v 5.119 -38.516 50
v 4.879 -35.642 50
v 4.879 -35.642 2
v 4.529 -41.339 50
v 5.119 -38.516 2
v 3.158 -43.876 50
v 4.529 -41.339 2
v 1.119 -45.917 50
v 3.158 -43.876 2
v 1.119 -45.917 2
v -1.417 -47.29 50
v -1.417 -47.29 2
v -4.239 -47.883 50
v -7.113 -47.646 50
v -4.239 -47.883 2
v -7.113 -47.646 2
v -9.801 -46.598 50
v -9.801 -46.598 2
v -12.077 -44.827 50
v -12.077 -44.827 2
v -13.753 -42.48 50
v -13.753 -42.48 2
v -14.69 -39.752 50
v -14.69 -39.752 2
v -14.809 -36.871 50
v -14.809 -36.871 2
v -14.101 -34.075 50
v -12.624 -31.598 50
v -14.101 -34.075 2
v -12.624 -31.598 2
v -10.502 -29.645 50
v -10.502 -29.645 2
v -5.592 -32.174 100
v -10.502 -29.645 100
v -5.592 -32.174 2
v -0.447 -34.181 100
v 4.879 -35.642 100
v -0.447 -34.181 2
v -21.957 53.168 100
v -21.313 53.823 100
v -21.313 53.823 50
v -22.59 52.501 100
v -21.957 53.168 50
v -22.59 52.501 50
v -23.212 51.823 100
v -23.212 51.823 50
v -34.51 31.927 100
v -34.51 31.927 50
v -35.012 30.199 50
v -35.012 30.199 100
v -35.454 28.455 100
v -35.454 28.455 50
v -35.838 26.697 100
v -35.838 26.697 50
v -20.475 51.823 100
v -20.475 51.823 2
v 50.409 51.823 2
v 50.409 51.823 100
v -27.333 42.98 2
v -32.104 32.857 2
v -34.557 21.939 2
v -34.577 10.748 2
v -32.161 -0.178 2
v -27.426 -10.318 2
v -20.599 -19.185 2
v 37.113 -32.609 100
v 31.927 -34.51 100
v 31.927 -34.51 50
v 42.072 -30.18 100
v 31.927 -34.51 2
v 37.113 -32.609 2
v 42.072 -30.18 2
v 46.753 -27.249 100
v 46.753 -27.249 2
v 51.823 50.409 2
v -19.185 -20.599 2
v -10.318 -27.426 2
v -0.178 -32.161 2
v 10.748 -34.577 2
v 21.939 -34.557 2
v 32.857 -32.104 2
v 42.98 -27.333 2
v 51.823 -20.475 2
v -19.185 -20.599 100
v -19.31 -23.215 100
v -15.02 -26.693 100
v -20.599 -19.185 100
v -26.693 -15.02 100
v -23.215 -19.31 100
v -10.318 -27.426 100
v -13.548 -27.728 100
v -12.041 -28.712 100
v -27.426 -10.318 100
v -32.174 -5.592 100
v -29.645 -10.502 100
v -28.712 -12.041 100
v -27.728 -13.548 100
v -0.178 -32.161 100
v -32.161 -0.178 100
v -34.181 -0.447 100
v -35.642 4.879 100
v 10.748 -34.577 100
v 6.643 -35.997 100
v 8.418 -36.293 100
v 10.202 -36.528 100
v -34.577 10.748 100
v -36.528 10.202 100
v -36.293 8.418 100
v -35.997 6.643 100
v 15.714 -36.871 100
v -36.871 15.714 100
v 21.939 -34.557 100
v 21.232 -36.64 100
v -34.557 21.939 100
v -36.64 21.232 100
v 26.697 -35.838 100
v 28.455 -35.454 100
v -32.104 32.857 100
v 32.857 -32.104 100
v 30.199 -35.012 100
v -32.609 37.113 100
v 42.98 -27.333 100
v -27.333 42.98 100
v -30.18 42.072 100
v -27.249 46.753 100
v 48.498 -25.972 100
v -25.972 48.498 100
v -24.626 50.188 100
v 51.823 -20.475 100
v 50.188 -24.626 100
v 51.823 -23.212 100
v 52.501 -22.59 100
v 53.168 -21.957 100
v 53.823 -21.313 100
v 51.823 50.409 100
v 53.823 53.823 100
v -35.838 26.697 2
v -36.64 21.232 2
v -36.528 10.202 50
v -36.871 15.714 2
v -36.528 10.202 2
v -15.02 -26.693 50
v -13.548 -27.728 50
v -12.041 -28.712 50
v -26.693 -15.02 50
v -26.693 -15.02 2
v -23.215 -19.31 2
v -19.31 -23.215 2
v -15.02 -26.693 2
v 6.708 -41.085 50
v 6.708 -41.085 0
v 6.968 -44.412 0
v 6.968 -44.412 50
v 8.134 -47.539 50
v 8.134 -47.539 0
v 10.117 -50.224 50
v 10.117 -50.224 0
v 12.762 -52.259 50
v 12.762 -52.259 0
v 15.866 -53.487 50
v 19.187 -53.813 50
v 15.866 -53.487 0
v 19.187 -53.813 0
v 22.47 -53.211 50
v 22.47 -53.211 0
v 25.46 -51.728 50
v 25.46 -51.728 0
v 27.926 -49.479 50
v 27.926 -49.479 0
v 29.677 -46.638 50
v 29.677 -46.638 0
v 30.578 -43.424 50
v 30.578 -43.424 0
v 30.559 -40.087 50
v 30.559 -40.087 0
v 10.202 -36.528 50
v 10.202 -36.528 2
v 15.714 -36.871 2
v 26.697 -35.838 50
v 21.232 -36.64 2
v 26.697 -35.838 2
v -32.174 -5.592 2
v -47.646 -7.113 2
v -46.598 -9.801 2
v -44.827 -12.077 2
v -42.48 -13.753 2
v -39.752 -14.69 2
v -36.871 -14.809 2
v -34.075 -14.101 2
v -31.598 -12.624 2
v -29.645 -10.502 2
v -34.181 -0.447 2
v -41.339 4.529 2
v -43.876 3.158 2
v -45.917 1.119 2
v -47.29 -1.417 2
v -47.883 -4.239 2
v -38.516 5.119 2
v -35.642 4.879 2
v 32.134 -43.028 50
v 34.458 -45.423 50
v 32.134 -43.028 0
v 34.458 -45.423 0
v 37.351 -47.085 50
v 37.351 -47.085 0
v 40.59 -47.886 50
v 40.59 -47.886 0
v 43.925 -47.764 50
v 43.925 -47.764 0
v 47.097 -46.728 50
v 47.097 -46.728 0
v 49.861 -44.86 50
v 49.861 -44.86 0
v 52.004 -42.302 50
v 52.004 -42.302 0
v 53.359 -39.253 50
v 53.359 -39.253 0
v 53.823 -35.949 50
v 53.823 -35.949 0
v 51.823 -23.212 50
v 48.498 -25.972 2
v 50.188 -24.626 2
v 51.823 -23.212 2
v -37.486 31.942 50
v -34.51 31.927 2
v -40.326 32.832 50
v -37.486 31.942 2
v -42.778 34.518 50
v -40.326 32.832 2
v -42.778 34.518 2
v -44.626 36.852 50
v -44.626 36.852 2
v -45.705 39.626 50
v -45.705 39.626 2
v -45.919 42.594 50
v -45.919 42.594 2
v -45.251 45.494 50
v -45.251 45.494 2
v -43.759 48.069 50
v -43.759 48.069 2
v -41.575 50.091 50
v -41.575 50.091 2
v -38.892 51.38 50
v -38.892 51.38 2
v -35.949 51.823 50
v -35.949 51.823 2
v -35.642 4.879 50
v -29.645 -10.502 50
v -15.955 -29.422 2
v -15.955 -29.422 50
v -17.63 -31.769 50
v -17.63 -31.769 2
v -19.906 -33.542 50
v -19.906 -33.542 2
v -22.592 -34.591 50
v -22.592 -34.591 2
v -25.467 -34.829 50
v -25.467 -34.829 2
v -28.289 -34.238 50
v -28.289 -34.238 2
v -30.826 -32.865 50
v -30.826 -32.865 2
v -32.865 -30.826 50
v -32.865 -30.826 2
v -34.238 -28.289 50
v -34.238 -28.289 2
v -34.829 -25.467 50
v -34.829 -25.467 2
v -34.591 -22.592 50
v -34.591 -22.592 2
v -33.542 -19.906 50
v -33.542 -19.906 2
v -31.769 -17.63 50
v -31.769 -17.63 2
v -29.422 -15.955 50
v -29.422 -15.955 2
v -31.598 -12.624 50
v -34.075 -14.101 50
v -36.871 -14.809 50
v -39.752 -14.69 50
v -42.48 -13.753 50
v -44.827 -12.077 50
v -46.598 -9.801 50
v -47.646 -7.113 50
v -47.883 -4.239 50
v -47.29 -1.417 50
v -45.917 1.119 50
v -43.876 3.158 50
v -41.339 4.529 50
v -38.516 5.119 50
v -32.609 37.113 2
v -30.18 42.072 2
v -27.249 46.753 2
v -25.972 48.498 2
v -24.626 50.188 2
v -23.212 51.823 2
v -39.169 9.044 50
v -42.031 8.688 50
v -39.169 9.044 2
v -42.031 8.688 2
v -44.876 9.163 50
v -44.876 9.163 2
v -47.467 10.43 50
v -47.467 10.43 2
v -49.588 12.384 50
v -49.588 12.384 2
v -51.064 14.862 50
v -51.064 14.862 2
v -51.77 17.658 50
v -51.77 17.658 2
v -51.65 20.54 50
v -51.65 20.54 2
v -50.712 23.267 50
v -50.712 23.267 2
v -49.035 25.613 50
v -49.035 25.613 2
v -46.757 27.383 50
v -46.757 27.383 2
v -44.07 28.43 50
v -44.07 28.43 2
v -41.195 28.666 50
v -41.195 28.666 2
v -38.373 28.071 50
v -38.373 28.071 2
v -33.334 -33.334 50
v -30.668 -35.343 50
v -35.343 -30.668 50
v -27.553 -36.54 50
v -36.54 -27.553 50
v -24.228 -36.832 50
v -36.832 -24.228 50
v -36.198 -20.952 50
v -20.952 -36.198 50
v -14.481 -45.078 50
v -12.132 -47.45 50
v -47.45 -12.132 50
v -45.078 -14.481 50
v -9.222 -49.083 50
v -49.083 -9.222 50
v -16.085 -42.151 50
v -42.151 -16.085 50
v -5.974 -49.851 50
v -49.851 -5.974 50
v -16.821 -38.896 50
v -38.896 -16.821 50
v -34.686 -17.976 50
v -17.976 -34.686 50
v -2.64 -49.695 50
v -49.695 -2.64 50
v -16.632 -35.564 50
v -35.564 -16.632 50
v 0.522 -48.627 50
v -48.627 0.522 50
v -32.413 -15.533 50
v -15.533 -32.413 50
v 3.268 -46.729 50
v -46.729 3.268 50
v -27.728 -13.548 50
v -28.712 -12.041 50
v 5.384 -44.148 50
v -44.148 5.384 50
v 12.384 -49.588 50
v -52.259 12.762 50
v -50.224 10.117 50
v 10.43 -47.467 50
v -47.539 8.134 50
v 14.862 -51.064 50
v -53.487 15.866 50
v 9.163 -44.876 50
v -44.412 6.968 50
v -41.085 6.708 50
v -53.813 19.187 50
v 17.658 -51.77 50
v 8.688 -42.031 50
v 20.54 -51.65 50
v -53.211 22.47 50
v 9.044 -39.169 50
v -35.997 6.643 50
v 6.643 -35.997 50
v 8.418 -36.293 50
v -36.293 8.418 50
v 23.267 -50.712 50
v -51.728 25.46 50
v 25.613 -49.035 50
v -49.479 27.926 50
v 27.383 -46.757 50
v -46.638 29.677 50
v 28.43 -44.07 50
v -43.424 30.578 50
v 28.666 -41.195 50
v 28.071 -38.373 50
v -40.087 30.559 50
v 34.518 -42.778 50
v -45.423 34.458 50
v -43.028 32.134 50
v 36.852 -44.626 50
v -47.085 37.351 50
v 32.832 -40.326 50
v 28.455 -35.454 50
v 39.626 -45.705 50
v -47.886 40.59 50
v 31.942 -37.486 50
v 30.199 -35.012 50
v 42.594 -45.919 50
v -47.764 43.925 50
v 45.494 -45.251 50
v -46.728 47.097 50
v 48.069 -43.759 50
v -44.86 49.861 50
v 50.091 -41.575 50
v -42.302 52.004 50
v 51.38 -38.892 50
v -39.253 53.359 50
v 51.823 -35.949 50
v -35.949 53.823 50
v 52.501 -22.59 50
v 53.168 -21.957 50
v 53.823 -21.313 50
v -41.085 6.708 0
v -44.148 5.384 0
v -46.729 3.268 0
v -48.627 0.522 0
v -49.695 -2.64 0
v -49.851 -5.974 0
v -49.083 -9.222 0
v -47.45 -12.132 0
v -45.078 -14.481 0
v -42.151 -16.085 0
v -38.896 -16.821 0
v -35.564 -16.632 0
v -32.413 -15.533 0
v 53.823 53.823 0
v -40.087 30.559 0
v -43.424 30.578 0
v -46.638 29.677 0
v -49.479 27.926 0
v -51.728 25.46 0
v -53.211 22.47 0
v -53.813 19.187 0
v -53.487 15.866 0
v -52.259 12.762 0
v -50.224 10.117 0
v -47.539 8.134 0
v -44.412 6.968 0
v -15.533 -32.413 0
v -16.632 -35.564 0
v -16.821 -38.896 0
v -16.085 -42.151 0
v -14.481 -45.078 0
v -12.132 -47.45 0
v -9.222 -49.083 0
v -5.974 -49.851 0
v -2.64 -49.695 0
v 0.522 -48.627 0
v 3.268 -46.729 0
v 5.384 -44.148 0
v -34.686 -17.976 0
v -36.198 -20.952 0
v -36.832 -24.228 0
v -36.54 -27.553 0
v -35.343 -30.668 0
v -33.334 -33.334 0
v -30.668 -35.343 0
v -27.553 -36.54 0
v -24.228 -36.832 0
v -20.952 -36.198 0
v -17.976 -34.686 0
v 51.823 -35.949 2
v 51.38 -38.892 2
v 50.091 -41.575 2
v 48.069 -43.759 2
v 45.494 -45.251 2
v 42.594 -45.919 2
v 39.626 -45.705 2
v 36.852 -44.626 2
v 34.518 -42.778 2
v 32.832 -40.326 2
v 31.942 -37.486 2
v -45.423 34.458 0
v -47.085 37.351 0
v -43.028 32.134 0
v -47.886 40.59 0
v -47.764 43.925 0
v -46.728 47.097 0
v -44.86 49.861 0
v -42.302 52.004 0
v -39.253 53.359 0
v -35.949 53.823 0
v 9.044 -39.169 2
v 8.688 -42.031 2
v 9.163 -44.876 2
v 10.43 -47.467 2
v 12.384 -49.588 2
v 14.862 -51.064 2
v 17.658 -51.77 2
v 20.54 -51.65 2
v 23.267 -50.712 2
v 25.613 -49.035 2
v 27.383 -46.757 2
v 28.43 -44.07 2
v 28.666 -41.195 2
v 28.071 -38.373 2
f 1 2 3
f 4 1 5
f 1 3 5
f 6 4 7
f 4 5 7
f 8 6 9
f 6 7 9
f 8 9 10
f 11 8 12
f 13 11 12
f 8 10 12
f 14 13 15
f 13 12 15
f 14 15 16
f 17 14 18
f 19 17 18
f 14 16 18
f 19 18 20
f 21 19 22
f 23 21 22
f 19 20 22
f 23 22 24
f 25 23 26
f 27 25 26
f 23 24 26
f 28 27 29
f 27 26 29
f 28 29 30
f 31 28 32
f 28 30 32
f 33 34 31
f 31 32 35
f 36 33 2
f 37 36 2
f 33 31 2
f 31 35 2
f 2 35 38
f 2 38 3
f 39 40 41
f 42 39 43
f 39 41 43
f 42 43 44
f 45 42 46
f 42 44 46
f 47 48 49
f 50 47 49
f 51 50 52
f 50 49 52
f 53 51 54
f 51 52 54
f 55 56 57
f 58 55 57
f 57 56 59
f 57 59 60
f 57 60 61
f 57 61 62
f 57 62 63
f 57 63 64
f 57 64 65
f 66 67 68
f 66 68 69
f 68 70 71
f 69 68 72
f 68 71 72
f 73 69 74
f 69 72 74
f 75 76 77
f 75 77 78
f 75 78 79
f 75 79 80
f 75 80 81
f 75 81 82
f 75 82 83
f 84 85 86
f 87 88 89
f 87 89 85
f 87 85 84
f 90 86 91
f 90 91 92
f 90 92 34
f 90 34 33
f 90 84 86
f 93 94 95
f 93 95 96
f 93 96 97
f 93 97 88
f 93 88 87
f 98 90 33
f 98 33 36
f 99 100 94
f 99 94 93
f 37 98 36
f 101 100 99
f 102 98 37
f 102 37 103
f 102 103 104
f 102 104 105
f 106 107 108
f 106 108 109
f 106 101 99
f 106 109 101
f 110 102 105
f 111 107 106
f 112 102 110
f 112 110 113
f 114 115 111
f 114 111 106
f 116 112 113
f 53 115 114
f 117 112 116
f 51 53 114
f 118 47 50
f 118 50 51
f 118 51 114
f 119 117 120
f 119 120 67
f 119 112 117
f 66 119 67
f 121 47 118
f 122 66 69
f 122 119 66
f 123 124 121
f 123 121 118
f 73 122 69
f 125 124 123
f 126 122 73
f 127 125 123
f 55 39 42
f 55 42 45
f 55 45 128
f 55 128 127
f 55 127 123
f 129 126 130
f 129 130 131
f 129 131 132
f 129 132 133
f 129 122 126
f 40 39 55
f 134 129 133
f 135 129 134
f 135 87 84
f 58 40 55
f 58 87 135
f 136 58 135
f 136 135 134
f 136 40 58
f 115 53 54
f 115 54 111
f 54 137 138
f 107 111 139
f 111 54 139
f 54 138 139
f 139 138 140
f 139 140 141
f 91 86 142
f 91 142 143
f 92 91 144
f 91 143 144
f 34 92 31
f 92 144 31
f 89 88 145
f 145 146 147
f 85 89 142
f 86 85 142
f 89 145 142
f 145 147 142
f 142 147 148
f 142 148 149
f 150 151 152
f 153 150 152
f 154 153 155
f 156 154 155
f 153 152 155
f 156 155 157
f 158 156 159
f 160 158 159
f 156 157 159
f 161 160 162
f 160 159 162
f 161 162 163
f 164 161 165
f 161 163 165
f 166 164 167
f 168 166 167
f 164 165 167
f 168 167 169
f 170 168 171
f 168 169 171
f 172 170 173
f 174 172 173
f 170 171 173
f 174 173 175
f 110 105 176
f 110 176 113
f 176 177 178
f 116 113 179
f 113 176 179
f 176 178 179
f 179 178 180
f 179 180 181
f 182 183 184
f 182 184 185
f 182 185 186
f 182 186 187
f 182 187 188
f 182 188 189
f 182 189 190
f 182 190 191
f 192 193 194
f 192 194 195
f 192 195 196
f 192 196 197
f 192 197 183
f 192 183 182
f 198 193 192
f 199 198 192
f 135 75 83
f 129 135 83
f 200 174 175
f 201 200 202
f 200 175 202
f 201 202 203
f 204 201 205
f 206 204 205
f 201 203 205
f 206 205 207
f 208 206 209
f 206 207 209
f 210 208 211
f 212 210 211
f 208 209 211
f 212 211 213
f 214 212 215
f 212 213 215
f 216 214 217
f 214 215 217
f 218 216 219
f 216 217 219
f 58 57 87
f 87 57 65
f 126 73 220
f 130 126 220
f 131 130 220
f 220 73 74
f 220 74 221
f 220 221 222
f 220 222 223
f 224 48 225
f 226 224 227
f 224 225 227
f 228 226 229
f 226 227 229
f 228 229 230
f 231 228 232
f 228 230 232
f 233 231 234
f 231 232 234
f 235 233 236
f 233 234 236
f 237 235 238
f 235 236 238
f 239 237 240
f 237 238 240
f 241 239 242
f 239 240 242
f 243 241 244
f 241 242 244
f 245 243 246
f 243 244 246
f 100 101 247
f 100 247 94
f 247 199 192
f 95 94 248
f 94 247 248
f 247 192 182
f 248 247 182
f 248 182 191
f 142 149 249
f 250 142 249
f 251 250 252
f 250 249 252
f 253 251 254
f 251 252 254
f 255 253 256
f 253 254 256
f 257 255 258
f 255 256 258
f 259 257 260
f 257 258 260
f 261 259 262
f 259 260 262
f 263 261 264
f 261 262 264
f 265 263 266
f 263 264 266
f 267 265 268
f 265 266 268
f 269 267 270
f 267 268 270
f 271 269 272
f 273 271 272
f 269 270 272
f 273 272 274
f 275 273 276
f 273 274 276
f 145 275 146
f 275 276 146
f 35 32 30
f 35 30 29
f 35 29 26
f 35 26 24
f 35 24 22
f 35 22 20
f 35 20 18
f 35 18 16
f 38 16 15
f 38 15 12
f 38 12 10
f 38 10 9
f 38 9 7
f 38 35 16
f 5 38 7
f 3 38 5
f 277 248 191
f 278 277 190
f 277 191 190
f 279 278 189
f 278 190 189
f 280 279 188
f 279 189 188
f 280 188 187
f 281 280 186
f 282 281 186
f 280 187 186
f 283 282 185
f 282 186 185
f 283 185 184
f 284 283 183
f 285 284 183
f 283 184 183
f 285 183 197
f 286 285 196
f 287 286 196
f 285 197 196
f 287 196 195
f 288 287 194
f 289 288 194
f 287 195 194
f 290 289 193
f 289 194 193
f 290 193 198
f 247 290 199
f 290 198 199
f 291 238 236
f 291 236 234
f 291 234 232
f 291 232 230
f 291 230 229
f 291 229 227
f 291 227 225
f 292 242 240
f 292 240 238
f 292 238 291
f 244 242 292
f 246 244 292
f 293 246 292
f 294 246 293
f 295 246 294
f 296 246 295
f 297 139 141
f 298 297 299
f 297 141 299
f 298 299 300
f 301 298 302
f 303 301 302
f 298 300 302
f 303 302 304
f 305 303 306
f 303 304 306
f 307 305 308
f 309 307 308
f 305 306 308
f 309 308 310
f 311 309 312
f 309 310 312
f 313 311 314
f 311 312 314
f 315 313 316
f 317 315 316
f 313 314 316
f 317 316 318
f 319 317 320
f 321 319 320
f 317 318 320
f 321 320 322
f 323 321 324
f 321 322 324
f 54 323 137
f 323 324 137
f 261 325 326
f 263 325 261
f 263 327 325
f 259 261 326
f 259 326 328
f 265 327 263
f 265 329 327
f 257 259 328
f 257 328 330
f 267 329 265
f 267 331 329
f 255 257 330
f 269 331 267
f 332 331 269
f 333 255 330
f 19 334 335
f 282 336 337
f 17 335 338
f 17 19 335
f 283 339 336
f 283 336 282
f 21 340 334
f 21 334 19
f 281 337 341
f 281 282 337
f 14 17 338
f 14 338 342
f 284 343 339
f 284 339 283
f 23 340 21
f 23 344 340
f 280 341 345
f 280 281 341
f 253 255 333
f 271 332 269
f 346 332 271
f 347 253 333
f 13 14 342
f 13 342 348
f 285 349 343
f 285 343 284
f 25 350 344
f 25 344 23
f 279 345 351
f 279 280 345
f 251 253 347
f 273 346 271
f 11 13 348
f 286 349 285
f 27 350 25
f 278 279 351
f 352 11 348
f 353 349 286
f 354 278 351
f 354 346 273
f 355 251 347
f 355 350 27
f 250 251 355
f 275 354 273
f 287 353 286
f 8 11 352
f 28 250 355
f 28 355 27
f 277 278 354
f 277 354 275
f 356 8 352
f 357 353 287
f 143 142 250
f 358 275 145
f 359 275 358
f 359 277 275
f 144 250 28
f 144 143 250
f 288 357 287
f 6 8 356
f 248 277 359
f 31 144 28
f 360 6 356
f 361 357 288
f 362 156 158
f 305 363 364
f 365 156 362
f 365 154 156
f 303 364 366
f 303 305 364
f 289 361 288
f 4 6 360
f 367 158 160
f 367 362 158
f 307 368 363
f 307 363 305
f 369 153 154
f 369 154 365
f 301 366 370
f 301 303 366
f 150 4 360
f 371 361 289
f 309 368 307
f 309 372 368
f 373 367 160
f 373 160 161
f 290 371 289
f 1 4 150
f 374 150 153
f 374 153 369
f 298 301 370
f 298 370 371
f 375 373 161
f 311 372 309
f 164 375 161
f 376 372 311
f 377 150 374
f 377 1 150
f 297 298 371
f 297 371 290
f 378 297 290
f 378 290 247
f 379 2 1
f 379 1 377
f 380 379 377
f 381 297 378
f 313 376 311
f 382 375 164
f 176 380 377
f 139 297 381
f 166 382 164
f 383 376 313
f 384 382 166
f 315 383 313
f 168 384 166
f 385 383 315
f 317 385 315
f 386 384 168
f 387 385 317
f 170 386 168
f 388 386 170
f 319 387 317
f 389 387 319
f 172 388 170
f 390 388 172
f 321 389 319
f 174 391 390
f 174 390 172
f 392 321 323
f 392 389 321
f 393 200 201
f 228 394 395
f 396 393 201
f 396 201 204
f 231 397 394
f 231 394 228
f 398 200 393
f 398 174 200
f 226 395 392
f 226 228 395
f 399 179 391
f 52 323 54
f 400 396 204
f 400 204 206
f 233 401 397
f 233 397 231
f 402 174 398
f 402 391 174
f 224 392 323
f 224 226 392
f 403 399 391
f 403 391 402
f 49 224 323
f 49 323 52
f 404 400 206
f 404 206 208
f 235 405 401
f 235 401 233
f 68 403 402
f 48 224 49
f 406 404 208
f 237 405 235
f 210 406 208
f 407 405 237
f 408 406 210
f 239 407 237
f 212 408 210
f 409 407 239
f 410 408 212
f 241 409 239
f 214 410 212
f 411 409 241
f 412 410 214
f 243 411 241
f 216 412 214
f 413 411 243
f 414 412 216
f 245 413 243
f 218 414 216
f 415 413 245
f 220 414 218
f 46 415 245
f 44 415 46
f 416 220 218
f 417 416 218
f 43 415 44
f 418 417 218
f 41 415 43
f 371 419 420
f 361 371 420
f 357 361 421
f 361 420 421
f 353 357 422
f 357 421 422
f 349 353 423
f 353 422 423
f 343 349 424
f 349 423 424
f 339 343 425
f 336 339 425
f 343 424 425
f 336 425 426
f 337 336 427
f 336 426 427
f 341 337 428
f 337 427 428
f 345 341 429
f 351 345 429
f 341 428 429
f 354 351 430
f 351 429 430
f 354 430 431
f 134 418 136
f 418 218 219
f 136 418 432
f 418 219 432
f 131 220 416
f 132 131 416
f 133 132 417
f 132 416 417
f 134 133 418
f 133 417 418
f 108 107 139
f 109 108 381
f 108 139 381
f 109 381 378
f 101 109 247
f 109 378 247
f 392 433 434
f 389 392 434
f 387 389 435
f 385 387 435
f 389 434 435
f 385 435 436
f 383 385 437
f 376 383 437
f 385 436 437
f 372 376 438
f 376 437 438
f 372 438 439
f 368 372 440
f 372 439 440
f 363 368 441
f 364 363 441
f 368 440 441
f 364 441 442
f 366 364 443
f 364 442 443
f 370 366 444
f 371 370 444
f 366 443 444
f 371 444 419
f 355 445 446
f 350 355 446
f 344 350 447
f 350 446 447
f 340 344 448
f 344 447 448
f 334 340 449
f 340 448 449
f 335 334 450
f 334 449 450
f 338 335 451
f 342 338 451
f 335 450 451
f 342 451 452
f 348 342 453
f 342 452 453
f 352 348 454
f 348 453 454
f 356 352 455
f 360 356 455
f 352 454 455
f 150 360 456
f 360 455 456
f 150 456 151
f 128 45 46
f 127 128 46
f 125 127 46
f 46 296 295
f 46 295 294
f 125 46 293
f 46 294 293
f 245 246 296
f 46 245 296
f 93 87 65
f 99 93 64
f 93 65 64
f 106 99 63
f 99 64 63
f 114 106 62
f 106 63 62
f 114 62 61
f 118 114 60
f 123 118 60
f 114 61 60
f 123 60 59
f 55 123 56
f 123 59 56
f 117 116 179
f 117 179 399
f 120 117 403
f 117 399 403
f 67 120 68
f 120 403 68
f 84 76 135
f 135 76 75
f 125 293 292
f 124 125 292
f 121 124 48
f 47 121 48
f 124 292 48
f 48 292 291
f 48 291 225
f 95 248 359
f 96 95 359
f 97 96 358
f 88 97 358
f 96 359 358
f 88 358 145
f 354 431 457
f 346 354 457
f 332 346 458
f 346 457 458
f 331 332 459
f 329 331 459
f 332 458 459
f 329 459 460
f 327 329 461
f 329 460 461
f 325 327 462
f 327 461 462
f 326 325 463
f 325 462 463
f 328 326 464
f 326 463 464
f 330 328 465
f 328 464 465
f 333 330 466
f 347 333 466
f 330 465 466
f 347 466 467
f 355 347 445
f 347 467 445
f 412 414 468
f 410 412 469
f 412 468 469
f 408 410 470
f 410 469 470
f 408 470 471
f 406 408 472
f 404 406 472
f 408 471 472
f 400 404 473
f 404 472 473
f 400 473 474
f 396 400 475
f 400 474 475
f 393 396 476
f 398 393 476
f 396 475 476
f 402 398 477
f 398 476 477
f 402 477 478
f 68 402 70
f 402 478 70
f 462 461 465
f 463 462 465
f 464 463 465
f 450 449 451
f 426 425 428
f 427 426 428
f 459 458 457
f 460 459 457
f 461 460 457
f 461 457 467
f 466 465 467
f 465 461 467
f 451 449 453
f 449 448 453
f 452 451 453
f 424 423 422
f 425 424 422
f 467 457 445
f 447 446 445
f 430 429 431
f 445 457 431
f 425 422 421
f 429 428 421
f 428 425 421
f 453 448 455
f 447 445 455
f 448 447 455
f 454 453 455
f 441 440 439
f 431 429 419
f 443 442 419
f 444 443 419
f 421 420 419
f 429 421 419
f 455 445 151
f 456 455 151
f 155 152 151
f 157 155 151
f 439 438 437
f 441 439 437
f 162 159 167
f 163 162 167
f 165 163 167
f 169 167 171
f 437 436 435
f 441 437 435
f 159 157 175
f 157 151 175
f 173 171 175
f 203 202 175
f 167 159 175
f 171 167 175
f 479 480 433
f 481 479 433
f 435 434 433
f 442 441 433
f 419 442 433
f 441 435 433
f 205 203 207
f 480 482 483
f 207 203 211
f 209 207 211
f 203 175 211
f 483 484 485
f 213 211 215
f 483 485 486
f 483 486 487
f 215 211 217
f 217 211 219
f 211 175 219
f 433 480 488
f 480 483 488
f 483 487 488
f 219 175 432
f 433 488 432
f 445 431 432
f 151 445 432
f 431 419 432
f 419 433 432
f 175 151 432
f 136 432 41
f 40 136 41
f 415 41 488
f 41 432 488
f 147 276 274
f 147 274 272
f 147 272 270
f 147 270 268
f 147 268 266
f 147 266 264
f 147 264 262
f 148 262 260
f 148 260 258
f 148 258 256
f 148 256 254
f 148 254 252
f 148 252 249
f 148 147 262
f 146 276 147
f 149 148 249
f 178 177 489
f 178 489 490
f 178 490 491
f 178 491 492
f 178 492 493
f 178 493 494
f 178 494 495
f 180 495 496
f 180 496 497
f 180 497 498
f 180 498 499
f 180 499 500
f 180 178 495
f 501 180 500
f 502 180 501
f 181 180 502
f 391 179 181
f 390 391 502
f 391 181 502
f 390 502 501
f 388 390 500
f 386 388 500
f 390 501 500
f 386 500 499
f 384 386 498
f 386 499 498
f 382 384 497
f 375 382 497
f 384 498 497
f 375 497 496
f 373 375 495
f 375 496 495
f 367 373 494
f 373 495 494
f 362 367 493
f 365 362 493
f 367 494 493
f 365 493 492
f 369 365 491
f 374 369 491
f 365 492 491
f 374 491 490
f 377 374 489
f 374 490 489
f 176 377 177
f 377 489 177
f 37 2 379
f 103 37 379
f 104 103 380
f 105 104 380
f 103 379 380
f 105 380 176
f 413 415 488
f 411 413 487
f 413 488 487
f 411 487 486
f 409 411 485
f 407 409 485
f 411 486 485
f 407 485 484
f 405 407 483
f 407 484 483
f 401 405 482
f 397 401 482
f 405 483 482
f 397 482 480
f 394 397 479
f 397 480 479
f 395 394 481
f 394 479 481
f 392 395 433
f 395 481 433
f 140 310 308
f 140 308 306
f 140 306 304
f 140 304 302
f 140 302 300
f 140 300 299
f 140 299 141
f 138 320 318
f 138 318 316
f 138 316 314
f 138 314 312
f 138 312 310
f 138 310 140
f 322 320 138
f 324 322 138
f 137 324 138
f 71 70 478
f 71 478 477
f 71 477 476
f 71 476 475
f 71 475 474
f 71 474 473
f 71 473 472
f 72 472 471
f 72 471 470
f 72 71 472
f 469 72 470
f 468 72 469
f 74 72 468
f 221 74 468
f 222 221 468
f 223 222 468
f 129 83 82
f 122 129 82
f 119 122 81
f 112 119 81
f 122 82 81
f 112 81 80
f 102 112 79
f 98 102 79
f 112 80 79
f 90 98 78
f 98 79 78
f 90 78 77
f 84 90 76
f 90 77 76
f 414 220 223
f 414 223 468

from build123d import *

# Parameters (mm, degrees)
F1_DEPTH = 100
F2_DEPTH = 50
F3_DEPTH = 2


with BuildPart() as f1:
    # F0 (on Top) → F1 (new body)
    with BuildSketch(Plane.XY):
        with BuildLine():
            Line((53.8232761587, 53.8232761587), (-21.3128918473, 53.8232761587))
            ThreePointArc((-21.3128918473, 53.8232761587), (-22.275260259, 52.8355982228), (-23.2116708013, 51.8232761587))
            ThreePointArc((-23.2116708013, 51.8232761587), (-25.3075965949, 49.3498512806), (-27.2487584756, 46.7531945623))
            ThreePointArc((-27.2487584756, 46.7531945623), (-31.4587379196, 39.6240335494), (-34.51000041, 31.9273679805))
            ThreePointArc((-34.51000041, 31.9273679805), (-35.2404615897, 29.3288112664), (-35.838001078, 26.6965086449))
            ThreePointArc((-35.838001078, 26.6965086449), (-36.82764793, 18.4764439995), (-36.5281956308, 10.2024369904))
            ThreePointArc((-36.5281956308, 10.2024369904), (-36.1526574521, 7.5294159266), (-35.6418430025, 4.8789180245))
            ThreePointArc((-35.6418430025, 4.8789180245), (-33.2442555313, -3.0457547122), (-29.644590404, -10.5017103611))
            ThreePointArc((-29.644590404, -10.5017103611), (-28.2263865418, -12.7983967429), (-26.6933658701, -15.0200893749))
            ThreePointArc((-26.6933658701, -15.0200893749), (-21.3128918473, -21.3128918473), (-15.0200893749, -26.6933658701))
            ThreePointArc((-15.0200893749, -26.6933658701), (-12.7983967429, -28.2263865418), (-10.5017103611, -29.644590404))
            ThreePointArc((-10.5017103611, -29.644590404), (-3.0457547122, -33.2442555313), (4.8789180245, -35.6418430025))
            ThreePointArc((4.8789180245, -35.6418430025), (7.5294159266, -36.1526574521), (10.2024369904, -36.5281956308))
            ThreePointArc((10.2024369904, -36.5281956308), (18.4764439995, -36.82764793), (26.6965086449, -35.838001078))
            ThreePointArc((26.6965086449, -35.838001078), (29.3288112664, -35.2404615897), (31.9273679804, -34.51000041))
            ThreePointArc((31.9273679804, -34.51000041), (39.6240335494, -31.4587379196), (46.7531945623, -27.2487584756))
            ThreePointArc((46.7531945623, -27.2487584756), (49.3498512806, -25.3075965949), (51.8232761587, -23.2116708013))
            ThreePointArc((51.8232761587, -23.2116708013), (52.8355982228, -22.275260259), (53.8232761587, -21.3128918473))
            Line((53.8232761587, -21.3128918473), (53.8232761587, 53.8232761587))
        make_face()
        with BuildLine():
            Line((50.4090625964, 51.8232761587), (51.8232761587, 51.8232761587))
            Line((51.8232761587, 51.8232761587), (51.8232761587, 50.4090625964))
            Line((51.8232761587, 50.4090625964), (51.8232761587, -20.4751236071))
            ThreePointArc((51.8232761587, -20.4751236071), (16.3442953184, -34.8740241135), (-19.1846559534, -20.5988695157))
            ThreePointArc((-19.1846559534, -20.5988695157), (-19.8986782849, -19.8986782849), (-20.5988695157, -19.1846559534))
            ThreePointArc((-20.5988695157, -19.1846559534), (-34.8740241135, 16.3442953184), (-20.4751236071, 51.8232761587))
            Line((-20.4751236071, 51.8232761587), (50.4090625964, 51.8232761587))
        make_face(mode=Mode.SUBTRACT)
        with BuildLine():
            Line((51.8232761587, 50.4090625964), (51.8232761587, 51.8232761587))
            Line((51.8232761587, 51.8232761587), (50.4090625964, 51.8232761587))
            Line((50.4090625964, 51.8232761587), (-20.5988695157, -19.1846559534))
            ThreePointArc((-20.5988695157, -19.1846559534), (-19.8986782849, -19.8986782849), (-19.1846559534, -20.5988695157))
            Line((-19.1846559534, -20.5988695157), (51.8232761587, 50.4090625964))
        make_face()
    extrude(amount=F1_DEPTH)

    # F0 (on Top) → F2 (join)
    with BuildSketch(Plane.XY):
        with BuildLine():
            ThreePointArc((-23.2116708013, 51.8232761587), (-22.275260259, 52.8355982228), (-21.3128918473, 53.8232761587))
            Line((-21.3128918473, 53.8232761587), (-35.94909781, 53.8232761587))
            ThreePointArc((-35.94909781, 53.8232761587), (-47.7636920228, 43.9245528153), (-40.0867196477, 30.55917009))
            ThreePointArc((-40.0867196477, 30.55917009), (-53.8127839078, 19.1871871426), (-41.0847622997, 6.7082327726))
            ThreePointArc((-41.0847622997, 6.7082327726), (-49.0827986166, -9.2215585412), (-32.4125497133, -15.53263117))
            ThreePointArc((-32.4125497133, -15.53263117), (-33.3337071275, -33.3337071275), (-15.53263117, -32.4125497133))
            ThreePointArc((-15.53263117, -32.4125497133), (-9.2215585412, -49.0827986166), (6.7082327726, -41.0847622997))
            ThreePointArc((6.7082327726, -41.0847622997), (19.1871871426, -53.8127839078), (30.55917009, -40.0867196477))
            ThreePointArc((30.55917009, -40.0867196477), (43.9245528153, -47.7636920228), (53.8232761587, -35.94909781))
            Line((53.8232761587, -35.94909781), (53.8232761587, -21.3128918473))
            ThreePointArc((53.8232761587, -21.3128918473), (52.8355982228, -22.275260259), (51.8232761587, -23.2116708013))
            Line((51.8232761587, -23.2116708013), (51.8232761587, -35.94909781))
            ThreePointArc((51.8232761587, -35.94909781), (41.1018476394, -45.9230409065), (31.9273679804, -34.51000041))
            ThreePointArc((31.9273679804, -34.51000041), (29.3288112664, -35.2404615897), (26.6965086449, -35.838001078))
            ThreePointArc((26.6965086449, -35.838001078), (19.1035703023, -51.8145326163), (10.2024369904, -36.5281956308))
            ThreePointArc((10.2024369904, -36.5281956308), (7.5294159266, -36.1526574521), (4.8789180245, -35.6418430025))
            ThreePointArc((4.8789180245, -35.6418430025), (-8.4949933848, -47.2194406066), (-10.5017103611, -29.644590404))
            ThreePointArc((-10.5017103611, -29.644590404), (-12.7983967429, -28.2263865418), (-15.0200893749, -26.6933658701))
            ThreePointArc((-15.0200893749, -26.6933658701), (-31.9194935651, -31.9194935651), (-26.6933658701, -15.0200893749))
            ThreePointArc((-26.6933658701, -15.0200893749), (-28.2263865418, -12.7983967429), (-29.644590404, -10.5017103611))
            ThreePointArc((-29.644590404, -10.5017103611), (-47.2194406066, -8.4949933848), (-35.6418430025, 4.8789180245))
            ThreePointArc((-35.6418430025, 4.8789180245), (-36.1526574521, 7.5294159266), (-36.5281956308, 10.2024369904))
            ThreePointArc((-36.5281956308, 10.2024369904), (-51.8145326163, 19.1035703023), (-35.838001078, 26.6965086449))
            ThreePointArc((-35.838001078, 26.6965086449), (-35.2404615897, 29.3288112664), (-34.51000041, 31.9273679805))
            ThreePointArc((-34.51000041, 31.9273679805), (-45.9230409065, 41.1018476394), (-35.94909781, 51.8232761587))
            Line((-35.94909781, 51.8232761587), (-23.2116708013, 51.8232761587))
        make_face()
    extrude(amount=F2_DEPTH)

    # F0 (on Top) → F3 (join)
    with BuildSketch(Plane.XY):
        with BuildLine():
            ThreePointArc((-29.644590404, -10.5017103611), (-33.2442555313, -3.0457547122), (-35.6418430025, 4.8789180245))
            ThreePointArc((-35.6418430025, 4.8789180245), (-47.2194406066, -8.4949933848), (-29.644590404, -10.5017103611))
        make_face()
        with BuildLine():
            ThreePointArc((-15.0200893749, -26.6933658701), (-21.3128918473, -21.3128918473), (-26.6933658701, -15.0200893749))
            ThreePointArc((-26.6933658701, -15.0200893749), (-31.9194935651, -31.9194935651), (-15.0200893749, -26.6933658701))
        make_face()
        with BuildLine():
            ThreePointArc((-10.5017103611, -29.644590404), (-8.4949933848, -47.2194406066), (4.8789180245, -35.6418430025))
            ThreePointArc((4.8789180245, -35.6418430025), (-3.0457547122, -33.2442555313), (-10.5017103611, -29.644590404))
        make_face()
        with BuildLine():
            ThreePointArc((10.2024369904, -36.5281956308), (19.1035703023, -51.8145326163), (26.6965086449, -35.838001078))
            ThreePointArc((26.6965086449, -35.838001078), (18.4764439995, -36.82764793), (10.2024369904, -36.5281956308))
        make_face()
        with BuildLine():
            ThreePointArc((51.8232761587, -35.94909781), (50.4632756968, -30.9141789445), (46.7531945623, -27.2487584756))
            ThreePointArc((46.7531945623, -27.2487584756), (39.6240335494, -31.4587379196), (31.9273679804, -34.51000041))
            ThreePointArc((31.9273679804, -34.51000041), (41.1018476394, -45.9230409065), (51.8232761587, -35.94909781))
        make_face()
        with BuildLine():
            Line((51.8232761587, 50.4090625964), (51.8232761587, 51.8232761587))
            Line((51.8232761587, 51.8232761587), (50.4090625964, 51.8232761587))
            Line((50.4090625964, 51.8232761587), (-20.5988695157, -19.1846559534))
            ThreePointArc((-20.5988695157, -19.1846559534), (-19.8986782849, -19.8986782849), (-19.1846559534, -20.5988695157))
            Line((-19.1846559534, -20.5988695157), (51.8232761587, 50.4090625964))
        make_face()
        with BuildLine():
            Line((-20.5988695157, -19.1846559534), (50.4090625964, 51.8232761587))
            Line((50.4090625964, 51.8232761587), (-20.4751236071, 51.8232761587))
            ThreePointArc((-20.4751236071, 51.8232761587), (-34.8740241135, 16.3442953184), (-20.5988695157, -19.1846559534))
        make_face()
        with BuildLine():
            ThreePointArc((-36.5281956308, 10.2024369904), (-36.82764793, 18.4764439995), (-35.838001078, 26.6965086449))
            ThreePointArc((-35.838001078, 26.6965086449), (-51.8145326163, 19.1035703023), (-36.5281956308, 10.2024369904))
        make_face()
        with BuildLine():
            ThreePointArc((-34.51000041, 31.9273679805), (-31.4587379196, 39.6240335494), (-27.2487584756, 46.7531945623))
            ThreePointArc((-27.2487584756, 46.7531945623), (-30.9141789445, 50.4632756968), (-35.94909781, 51.8232761587))
            ThreePointArc((-35.94909781, 51.8232761587), (-45.9230409065, 41.1018476394), (-34.51000041, 31.9273679805))
        make_face()
        with BuildLine():
            Line((51.8232761587, -35.94909781), (51.8232761587, -23.2116708013))
            ThreePointArc((51.8232761587, -23.2116708013), (49.3498512806, -25.3075965949), (46.7531945623, -27.2487584756))
            ThreePointArc((46.7531945623, -27.2487584756), (50.4632756968, -30.9141789445), (51.8232761587, -35.94909781))
        make_face()
        with BuildLine():
            ThreePointArc((-27.2487584756, 46.7531945623), (-25.3075965949, 49.3498512806), (-23.2116708013, 51.8232761587))
            Line((-23.2116708013, 51.8232761587), (-35.94909781, 51.8232761587))
            ThreePointArc((-35.94909781, 51.8232761587), (-30.9141789445, 50.4632756968), (-27.2487584756, 46.7531945623))
        make_face()
        with BuildLine():
            Line((51.8232761587, -20.4751236071), (51.8232761587, 50.4090625964))
            Line((51.8232761587, 50.4090625964), (-19.1846559534, -20.5988695157))
            ThreePointArc((-19.1846559534, -20.5988695157), (16.3442953184, -34.8740241135), (51.8232761587, -20.4751236071))
        make_face()
    extrude(amount=F3_DEPTH)


solid = f1.part
